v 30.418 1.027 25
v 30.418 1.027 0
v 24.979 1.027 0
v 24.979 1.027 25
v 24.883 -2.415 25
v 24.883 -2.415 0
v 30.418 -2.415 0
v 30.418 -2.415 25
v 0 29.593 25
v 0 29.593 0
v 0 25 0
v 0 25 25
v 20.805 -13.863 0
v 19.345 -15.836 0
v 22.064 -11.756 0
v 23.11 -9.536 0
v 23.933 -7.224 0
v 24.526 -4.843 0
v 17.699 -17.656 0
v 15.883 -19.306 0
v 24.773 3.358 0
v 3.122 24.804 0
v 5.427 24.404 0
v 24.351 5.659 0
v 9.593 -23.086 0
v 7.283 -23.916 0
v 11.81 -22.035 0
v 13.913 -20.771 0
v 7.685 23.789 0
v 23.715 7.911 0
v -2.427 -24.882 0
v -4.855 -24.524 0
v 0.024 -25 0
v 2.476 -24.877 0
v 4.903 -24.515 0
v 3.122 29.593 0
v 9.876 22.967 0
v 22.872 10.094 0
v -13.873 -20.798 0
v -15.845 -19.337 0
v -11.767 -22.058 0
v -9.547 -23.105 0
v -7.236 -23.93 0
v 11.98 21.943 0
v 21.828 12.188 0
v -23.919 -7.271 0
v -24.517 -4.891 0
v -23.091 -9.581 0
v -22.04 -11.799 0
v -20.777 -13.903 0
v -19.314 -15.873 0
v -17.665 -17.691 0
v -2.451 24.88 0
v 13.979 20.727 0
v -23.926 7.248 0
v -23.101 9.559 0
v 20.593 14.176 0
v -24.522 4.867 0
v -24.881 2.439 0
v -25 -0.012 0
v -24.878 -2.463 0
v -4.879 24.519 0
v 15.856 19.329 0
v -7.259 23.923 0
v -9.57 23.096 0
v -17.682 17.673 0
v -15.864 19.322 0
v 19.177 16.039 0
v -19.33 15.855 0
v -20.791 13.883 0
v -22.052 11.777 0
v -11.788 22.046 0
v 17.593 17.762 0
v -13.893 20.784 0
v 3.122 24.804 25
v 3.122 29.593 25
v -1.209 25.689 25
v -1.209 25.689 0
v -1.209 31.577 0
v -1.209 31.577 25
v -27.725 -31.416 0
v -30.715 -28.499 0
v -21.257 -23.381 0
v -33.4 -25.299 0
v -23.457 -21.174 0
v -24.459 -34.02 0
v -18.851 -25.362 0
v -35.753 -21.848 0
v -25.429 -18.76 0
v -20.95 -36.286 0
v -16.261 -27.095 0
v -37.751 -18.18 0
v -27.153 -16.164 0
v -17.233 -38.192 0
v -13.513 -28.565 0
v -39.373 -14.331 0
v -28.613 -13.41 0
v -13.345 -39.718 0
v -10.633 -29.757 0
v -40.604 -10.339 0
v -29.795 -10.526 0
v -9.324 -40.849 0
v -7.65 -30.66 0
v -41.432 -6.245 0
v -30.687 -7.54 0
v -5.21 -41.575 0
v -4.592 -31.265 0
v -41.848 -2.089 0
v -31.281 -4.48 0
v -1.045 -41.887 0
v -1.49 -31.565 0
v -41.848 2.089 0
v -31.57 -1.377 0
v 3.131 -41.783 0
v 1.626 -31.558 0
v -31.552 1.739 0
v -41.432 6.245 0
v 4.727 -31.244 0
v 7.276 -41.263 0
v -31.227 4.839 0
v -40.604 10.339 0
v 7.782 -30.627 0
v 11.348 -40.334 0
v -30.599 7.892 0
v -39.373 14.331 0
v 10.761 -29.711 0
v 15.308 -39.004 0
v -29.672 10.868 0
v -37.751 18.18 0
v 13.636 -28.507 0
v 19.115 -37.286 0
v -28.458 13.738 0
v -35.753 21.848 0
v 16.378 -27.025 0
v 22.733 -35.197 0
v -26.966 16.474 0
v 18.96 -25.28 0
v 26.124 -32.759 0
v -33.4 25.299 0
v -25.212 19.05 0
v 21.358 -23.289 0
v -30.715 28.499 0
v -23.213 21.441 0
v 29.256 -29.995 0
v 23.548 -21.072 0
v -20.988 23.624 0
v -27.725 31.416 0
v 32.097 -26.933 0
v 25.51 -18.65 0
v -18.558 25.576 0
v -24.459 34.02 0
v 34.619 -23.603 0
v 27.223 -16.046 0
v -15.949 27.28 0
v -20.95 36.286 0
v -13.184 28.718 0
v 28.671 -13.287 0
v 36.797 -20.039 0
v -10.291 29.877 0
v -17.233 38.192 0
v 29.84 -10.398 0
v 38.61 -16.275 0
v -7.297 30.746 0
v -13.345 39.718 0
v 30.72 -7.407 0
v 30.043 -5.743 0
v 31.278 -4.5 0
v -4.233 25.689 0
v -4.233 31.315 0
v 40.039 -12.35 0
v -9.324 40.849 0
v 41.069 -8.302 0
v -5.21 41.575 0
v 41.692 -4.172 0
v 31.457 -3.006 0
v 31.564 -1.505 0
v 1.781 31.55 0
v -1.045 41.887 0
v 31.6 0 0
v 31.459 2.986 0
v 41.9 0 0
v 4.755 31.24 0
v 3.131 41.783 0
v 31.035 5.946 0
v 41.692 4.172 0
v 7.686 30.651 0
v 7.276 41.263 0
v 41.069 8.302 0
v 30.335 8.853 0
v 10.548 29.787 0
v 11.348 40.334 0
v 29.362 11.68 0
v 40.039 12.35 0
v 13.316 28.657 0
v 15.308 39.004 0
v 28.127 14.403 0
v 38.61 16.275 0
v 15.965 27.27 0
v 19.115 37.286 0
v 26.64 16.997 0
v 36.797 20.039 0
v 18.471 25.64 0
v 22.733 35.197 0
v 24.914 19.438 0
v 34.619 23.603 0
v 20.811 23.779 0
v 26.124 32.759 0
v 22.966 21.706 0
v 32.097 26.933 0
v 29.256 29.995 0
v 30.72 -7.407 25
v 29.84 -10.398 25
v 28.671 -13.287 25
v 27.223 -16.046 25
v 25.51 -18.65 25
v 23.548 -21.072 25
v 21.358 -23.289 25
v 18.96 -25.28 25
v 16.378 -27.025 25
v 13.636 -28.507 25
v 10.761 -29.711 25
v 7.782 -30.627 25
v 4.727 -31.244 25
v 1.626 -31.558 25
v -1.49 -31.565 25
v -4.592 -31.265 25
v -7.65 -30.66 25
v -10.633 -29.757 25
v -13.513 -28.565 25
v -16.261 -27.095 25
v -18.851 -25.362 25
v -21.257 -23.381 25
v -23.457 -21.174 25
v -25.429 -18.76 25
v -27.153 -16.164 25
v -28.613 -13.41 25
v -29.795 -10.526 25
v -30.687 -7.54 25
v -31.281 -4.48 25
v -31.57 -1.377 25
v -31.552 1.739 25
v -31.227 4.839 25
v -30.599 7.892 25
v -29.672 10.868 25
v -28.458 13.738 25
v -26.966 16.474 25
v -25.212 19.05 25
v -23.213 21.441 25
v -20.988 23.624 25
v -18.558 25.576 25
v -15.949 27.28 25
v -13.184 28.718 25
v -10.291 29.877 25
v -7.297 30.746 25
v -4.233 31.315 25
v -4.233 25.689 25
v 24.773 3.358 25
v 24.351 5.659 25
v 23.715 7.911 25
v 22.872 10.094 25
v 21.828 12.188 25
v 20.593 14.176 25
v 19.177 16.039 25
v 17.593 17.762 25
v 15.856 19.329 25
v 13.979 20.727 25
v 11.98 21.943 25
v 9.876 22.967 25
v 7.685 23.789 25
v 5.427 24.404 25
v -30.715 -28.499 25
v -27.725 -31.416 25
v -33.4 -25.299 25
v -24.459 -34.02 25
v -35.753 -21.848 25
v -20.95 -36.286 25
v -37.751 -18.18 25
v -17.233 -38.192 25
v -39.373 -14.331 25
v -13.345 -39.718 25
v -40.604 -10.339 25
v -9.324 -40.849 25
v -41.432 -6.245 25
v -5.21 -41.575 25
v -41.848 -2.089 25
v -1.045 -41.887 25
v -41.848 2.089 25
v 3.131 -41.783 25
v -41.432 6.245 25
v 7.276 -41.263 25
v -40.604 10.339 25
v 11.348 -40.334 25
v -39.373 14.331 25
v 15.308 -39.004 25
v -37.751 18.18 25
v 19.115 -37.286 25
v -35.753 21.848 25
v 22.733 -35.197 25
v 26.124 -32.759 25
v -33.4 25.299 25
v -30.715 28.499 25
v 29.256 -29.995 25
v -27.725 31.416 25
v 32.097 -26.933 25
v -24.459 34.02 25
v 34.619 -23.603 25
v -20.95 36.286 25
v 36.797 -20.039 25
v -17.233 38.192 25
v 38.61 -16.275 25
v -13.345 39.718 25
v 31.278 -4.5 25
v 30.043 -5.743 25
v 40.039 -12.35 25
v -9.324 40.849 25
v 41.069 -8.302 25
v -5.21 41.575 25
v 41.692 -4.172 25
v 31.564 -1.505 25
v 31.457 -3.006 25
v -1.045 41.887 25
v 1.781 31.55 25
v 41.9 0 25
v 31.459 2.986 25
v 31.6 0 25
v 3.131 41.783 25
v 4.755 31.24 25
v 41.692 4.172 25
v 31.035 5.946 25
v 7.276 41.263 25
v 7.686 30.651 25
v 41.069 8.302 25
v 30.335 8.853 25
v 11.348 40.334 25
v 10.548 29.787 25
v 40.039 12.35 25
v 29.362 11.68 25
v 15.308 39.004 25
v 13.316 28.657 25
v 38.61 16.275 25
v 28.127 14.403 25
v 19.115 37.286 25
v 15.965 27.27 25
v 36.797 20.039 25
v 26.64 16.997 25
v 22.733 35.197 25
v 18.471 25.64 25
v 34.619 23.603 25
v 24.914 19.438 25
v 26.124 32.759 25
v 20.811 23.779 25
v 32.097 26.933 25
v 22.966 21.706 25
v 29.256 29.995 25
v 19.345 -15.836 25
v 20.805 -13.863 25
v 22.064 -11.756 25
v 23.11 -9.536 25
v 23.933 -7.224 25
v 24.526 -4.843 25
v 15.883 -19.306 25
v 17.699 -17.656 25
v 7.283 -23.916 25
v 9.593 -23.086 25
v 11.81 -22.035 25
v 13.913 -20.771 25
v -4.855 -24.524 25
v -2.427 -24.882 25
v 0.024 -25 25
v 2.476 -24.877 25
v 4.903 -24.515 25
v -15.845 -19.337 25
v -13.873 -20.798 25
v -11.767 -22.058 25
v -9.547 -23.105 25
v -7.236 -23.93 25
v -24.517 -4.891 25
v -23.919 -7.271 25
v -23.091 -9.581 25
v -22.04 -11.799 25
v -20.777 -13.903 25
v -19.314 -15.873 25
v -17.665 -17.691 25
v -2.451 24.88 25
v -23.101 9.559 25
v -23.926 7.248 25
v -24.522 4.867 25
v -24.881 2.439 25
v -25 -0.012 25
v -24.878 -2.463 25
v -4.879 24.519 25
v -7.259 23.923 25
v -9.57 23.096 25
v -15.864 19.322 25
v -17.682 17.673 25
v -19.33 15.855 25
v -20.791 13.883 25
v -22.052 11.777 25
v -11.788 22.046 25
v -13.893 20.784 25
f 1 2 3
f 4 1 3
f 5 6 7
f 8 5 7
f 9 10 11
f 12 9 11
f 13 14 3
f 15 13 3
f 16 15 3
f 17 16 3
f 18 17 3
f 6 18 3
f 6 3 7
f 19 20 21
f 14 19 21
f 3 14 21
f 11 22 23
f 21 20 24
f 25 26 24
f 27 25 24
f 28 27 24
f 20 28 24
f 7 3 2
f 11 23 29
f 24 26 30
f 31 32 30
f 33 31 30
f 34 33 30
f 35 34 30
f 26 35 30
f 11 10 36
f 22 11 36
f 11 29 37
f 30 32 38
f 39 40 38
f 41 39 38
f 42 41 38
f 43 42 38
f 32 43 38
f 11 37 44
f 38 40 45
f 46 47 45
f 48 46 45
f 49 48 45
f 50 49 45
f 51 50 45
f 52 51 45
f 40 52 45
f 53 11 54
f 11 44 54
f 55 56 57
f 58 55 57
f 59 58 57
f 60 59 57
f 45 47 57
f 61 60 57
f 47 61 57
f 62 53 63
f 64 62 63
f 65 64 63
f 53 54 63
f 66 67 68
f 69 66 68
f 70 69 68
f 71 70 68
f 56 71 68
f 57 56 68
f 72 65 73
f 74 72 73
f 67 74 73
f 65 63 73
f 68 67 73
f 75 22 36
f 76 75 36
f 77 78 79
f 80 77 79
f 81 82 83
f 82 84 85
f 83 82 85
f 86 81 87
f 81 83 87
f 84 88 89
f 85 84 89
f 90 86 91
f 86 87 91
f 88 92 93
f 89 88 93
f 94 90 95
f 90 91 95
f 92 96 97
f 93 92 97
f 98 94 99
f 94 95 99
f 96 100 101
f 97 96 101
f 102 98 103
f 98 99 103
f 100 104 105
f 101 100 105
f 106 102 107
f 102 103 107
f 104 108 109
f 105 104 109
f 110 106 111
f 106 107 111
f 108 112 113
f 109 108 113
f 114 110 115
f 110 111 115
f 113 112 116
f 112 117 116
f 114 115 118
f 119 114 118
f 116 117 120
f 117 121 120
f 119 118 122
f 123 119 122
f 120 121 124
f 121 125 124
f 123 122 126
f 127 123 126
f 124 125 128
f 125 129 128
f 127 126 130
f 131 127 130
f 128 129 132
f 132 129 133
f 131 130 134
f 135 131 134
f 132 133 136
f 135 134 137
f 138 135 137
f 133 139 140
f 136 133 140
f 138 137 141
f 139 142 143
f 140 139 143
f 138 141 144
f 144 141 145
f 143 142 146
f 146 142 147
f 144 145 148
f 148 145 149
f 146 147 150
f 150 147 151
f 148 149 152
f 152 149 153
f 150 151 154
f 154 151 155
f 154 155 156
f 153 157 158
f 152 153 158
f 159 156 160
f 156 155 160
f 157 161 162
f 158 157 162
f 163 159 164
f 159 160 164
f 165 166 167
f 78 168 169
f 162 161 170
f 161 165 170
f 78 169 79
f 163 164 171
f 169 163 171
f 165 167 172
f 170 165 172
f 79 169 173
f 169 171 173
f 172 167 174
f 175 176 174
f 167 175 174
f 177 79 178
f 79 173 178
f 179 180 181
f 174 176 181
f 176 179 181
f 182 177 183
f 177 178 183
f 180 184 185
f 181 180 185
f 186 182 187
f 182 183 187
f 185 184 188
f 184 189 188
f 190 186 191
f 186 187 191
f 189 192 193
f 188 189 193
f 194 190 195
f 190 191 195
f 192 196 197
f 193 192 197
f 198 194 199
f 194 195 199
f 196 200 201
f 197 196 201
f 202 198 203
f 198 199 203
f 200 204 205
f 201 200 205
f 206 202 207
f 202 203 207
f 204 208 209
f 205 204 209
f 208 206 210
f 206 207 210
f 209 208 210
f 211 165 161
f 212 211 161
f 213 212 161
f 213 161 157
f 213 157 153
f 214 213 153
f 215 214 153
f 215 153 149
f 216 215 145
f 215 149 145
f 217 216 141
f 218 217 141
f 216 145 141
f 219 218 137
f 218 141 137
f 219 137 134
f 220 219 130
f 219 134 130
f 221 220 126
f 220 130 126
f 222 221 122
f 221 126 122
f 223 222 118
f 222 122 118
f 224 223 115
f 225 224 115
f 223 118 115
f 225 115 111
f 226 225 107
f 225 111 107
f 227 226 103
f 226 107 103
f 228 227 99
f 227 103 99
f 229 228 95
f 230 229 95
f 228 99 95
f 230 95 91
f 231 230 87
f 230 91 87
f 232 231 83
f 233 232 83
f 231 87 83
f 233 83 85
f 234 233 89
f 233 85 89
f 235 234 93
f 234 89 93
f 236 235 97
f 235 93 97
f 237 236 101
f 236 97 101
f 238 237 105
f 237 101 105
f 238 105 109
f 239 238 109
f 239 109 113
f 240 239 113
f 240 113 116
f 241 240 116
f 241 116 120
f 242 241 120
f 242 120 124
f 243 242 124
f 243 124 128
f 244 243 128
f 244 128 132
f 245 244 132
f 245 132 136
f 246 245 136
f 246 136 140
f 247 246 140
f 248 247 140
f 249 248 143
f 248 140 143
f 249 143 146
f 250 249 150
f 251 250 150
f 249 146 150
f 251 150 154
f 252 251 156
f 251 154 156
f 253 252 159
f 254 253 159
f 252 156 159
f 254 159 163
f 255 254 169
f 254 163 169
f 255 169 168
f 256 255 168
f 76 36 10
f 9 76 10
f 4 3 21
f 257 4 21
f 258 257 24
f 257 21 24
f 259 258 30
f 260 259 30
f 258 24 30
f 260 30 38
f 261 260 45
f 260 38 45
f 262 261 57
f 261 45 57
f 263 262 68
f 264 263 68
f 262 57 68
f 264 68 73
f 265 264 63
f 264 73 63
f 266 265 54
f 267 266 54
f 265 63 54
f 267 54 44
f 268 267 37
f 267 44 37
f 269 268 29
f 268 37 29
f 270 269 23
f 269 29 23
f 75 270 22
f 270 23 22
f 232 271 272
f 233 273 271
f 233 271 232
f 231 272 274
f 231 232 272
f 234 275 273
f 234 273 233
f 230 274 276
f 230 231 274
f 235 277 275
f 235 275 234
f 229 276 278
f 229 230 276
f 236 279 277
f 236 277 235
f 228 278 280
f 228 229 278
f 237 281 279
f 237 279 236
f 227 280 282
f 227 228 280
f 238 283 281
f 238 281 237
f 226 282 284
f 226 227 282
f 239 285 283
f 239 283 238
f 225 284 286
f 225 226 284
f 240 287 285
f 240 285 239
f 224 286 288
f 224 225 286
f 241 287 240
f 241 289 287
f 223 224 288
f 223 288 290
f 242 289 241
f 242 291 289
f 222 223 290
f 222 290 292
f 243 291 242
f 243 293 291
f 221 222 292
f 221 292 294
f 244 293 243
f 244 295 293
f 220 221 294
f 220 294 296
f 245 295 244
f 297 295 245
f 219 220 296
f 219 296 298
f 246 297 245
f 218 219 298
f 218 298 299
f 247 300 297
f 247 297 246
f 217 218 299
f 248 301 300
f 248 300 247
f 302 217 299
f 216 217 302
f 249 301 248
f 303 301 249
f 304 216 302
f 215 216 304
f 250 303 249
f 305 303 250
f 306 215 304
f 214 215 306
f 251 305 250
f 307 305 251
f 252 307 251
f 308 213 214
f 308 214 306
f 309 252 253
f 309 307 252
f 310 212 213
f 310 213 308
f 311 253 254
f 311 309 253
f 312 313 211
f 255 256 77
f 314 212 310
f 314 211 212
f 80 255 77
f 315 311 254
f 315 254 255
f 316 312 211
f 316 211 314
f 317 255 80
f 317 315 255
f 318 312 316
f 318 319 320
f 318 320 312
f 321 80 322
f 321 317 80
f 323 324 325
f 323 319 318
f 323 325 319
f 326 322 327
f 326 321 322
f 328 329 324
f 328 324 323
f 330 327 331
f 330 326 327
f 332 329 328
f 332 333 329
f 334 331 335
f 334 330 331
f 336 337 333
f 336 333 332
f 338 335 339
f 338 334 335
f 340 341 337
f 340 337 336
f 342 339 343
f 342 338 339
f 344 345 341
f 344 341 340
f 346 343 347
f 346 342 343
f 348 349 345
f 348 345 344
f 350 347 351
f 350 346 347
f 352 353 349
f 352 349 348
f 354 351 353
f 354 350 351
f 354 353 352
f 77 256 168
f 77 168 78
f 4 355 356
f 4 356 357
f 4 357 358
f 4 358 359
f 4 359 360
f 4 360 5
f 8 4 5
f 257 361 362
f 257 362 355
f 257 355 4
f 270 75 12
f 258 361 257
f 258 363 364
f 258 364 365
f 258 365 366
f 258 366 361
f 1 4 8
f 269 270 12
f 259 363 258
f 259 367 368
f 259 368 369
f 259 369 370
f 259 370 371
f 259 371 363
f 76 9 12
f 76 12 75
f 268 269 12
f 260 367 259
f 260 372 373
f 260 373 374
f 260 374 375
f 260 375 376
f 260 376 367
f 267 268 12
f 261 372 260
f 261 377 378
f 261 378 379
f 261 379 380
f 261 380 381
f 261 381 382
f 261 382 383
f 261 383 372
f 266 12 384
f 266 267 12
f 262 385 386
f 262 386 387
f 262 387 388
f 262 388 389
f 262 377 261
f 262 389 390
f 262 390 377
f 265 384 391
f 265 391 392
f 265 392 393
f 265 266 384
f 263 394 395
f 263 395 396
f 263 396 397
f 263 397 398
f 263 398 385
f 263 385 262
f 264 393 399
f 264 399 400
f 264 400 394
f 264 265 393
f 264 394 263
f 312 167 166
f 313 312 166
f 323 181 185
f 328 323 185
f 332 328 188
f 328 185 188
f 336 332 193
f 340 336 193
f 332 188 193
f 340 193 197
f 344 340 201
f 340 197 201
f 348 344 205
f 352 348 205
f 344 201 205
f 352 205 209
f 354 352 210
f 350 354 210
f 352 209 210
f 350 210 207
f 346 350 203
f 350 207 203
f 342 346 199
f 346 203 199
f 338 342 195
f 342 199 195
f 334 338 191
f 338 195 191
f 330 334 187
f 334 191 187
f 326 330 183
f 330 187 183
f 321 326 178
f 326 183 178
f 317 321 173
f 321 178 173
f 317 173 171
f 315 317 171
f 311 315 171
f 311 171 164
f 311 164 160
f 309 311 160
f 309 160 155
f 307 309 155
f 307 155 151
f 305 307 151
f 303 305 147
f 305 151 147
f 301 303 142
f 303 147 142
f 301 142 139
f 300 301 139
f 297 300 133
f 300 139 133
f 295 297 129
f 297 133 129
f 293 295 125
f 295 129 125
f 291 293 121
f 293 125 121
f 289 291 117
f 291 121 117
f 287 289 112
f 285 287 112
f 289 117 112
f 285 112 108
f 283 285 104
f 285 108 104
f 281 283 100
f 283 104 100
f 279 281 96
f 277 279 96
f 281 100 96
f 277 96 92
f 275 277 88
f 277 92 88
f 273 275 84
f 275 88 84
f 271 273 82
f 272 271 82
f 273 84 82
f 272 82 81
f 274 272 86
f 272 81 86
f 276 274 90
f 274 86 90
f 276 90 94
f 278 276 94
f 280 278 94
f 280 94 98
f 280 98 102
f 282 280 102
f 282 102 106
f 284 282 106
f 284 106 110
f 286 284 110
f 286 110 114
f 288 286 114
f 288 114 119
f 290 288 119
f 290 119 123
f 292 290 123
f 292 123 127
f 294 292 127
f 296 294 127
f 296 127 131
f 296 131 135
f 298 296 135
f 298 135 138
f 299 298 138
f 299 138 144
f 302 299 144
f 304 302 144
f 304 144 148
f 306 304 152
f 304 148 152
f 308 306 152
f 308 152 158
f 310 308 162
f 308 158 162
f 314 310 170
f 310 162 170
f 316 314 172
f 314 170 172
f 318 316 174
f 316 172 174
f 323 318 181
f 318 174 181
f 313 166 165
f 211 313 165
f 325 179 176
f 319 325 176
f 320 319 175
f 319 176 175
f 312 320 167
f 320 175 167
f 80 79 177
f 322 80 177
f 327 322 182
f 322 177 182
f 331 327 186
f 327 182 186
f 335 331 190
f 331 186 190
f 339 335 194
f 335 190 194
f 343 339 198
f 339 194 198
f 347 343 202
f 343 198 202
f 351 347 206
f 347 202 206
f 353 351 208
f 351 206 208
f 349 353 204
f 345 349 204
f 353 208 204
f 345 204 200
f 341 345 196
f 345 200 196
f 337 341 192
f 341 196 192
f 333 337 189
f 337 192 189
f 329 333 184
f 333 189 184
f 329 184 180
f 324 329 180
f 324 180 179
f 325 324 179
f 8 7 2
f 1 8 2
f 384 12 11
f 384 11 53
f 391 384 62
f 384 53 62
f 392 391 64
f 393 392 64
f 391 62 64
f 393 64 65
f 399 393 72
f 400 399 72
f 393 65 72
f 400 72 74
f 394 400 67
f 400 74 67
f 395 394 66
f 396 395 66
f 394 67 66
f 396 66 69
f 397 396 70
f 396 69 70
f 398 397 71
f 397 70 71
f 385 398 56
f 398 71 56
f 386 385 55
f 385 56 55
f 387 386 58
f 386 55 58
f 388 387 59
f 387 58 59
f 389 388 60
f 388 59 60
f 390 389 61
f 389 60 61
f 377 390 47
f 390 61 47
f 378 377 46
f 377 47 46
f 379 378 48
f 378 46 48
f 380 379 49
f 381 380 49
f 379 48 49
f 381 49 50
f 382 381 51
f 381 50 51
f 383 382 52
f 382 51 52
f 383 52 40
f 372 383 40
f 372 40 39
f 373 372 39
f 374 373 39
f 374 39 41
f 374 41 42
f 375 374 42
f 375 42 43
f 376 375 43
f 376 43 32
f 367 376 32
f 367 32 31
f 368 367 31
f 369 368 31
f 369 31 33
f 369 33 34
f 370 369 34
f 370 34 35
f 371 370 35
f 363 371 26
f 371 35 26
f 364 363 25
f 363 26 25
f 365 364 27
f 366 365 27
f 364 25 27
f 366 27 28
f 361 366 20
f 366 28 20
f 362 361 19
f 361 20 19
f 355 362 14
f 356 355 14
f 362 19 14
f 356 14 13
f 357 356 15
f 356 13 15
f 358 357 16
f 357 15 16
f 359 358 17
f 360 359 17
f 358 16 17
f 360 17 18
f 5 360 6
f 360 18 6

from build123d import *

# Parameters (mm, degrees)
F1_DEPTH = 25
F0_R     = 41.9000014663
F2_DEPTH = 25


# Not quite as in the source:
# - a feature names something its author has since deleted; it is built from what else it names


with BuildPart() as f1:
    # F0 (on Top) → F1 (new body)
    with BuildSketch(Plane.XY):
        with BuildLine():
            ThreePointArc((24.978908438, 1.0267099133), (24.9947265533, 0.5134632655), (25, 0))
            ThreePointArc((25, 0), (24.9707623545, -1.2087296779), (24.8831178053, -2.414632123))
            Line((24.8831178053, -2.414632123), (30.4177384824, -2.414632123))
            Line((30.4177384824, -2.414632123), (30.4177384824, 1.0267099133))
            Line((30.4177384824, 1.0267099133), (24.978908438, 1.0267099133))
        make_face()
        with BuildLine():
            Line((23.4767496586, 1.0267099133), (24.978908438, 1.0267099133))
            ThreePointArc((24.978908438, 1.0267099133), (18.4053000445, 16.9187744908), (3.1217134092, 24.8043323916))
            Line((3.1217134092, 24.8043323916), (3.1217134092, 22.8428095579))
            Line((3.1217134092, 22.8428095579), (0, 22.8428095579))
            Line((0, 22.8428095579), (0, 25))
            ThreePointArc((0, 25), (-18.5116963441, -16.8022944404), (24.8831178053, -2.414632123))
            Line((24.8831178053, -2.414632123), (23.4767496586, -2.414632123))
            Line((23.4767496586, -2.414632123), (23.4767496586, 1.0267099133))
        make_face()
        with BuildLine():
            ThreePointArc((24.8831178053, -2.414632123), (24.9707623545, -1.2087296779), (25, 0))
            ThreePointArc((25, 0), (24.9947265533, 0.5134632655), (24.978908438, 1.0267099133))
            Line((24.978908438, 1.0267099133), (23.4767496586, 1.0267099133))
            Line((23.4767496586, 1.0267099133), (23.4767496586, -2.414632123))
            Line((23.4767496586, -2.414632123), (24.8831178053, -2.414632123))
        make_face()
        with BuildLine():
            Line((3.1217134092, 22.8428095579), (3.1217134092, 24.8043323916))
            ThreePointArc((3.1217134092, 24.8043323916), (1.5639197887, 24.9510351468), (0, 25))
            Line((0, 25), (0, 22.8428095579))
            Line((0, 22.8428095579), (3.1217134092, 22.8428095579))
        make_face()
        with BuildLine():
            ThreePointArc((0, 25), (1.5639197887, 24.9510351468), (3.1217134092, 24.8043323916))
            Line((3.1217134092, 24.8043323916), (3.1217134092, 29.5925959945))
            Line((3.1217134092, 29.5925959945), (0, 29.5925959945))
            Line((0, 29.5925959945), (0, 25))
        make_face()
    extrude(amount=F1_DEPTH)


with BuildPart() as f2:
    # F0 (on Top) → F2 (new body)
    with BuildSketch(Plane.XY):
        Circle(F0_R)
        with BuildLine():
            ThreePointArc((31.2779555005, -4.4999336962), (31.0328144506, -5.9602290926), (30.7195340658, -7.4074375018))
            ThreePointArc((30.7195340658, -7.4074375018), (-23.4572255231, -21.1735324006), (-4.2332089506, 31.3151695755))
            Line((-4.2332089506, 31.3151695755), (-4.2332089506, 32.823305577))
            Line((-4.2332089506, 32.823305577), (-1.2088371441, 32.823305577))
            Line((-1.2088371441, 32.823305577), (-1.2088371441, 31.5768683742))
            ThreePointArc((-1.2088371441, 31.5768683742), (21.9130172689, 22.7679506705), (31.5999984741, 0))
            ThreePointArc((31.5999984741, 0), (31.5193849056, -2.255721334), (31.2779555005, -4.4999336962))
        make_face(mode=Mode.SUBTRACT)
        with BuildLine():
            Line((-4.2332089506, 32.823305577), (-4.2332089506, 31.3151695755))
            ThreePointArc((-4.2332089506, 31.3151695755), (-2.7241673938, 31.4823572112), (-1.2088371441, 31.5768683742))
            Line((-1.2088371441, 31.5768683742), (-1.2088371441, 32.823305577))
            Line((-1.2088371441, 32.823305577), (-4.2332089506, 32.823305577))
        make_face()
        with BuildLine():
            ThreePointArc((-1.2088371441, 31.5768683742), (-2.7241673938, 31.4823572112), (-4.2332089506, 31.3151695755))
            Line((-4.2332089506, 31.3151695755), (-4.2332089506, 25.6888903677))
            Line((-4.2332089506, 25.6888903677), (-1.2088371441, 25.6888903677))
            Line((-1.2088371441, 25.6888903677), (-1.2088371441, 31.5768683742))
        make_face()
        with BuildLine():
            Line((30.0426278263, -5.7433205657), (30.7195340658, -7.4074375018))
            ThreePointArc((30.7195340658, -7.4074375018), (31.0328144506, -5.9602290926), (31.2779555005, -4.4999336962))
            Line((31.2779555005, -4.4999336962), (30.0426278263, -5.7433205657))
        make_face()
    extrude(amount=F2_DEPTH)


solid = Compound([f1.part, f2.part])
